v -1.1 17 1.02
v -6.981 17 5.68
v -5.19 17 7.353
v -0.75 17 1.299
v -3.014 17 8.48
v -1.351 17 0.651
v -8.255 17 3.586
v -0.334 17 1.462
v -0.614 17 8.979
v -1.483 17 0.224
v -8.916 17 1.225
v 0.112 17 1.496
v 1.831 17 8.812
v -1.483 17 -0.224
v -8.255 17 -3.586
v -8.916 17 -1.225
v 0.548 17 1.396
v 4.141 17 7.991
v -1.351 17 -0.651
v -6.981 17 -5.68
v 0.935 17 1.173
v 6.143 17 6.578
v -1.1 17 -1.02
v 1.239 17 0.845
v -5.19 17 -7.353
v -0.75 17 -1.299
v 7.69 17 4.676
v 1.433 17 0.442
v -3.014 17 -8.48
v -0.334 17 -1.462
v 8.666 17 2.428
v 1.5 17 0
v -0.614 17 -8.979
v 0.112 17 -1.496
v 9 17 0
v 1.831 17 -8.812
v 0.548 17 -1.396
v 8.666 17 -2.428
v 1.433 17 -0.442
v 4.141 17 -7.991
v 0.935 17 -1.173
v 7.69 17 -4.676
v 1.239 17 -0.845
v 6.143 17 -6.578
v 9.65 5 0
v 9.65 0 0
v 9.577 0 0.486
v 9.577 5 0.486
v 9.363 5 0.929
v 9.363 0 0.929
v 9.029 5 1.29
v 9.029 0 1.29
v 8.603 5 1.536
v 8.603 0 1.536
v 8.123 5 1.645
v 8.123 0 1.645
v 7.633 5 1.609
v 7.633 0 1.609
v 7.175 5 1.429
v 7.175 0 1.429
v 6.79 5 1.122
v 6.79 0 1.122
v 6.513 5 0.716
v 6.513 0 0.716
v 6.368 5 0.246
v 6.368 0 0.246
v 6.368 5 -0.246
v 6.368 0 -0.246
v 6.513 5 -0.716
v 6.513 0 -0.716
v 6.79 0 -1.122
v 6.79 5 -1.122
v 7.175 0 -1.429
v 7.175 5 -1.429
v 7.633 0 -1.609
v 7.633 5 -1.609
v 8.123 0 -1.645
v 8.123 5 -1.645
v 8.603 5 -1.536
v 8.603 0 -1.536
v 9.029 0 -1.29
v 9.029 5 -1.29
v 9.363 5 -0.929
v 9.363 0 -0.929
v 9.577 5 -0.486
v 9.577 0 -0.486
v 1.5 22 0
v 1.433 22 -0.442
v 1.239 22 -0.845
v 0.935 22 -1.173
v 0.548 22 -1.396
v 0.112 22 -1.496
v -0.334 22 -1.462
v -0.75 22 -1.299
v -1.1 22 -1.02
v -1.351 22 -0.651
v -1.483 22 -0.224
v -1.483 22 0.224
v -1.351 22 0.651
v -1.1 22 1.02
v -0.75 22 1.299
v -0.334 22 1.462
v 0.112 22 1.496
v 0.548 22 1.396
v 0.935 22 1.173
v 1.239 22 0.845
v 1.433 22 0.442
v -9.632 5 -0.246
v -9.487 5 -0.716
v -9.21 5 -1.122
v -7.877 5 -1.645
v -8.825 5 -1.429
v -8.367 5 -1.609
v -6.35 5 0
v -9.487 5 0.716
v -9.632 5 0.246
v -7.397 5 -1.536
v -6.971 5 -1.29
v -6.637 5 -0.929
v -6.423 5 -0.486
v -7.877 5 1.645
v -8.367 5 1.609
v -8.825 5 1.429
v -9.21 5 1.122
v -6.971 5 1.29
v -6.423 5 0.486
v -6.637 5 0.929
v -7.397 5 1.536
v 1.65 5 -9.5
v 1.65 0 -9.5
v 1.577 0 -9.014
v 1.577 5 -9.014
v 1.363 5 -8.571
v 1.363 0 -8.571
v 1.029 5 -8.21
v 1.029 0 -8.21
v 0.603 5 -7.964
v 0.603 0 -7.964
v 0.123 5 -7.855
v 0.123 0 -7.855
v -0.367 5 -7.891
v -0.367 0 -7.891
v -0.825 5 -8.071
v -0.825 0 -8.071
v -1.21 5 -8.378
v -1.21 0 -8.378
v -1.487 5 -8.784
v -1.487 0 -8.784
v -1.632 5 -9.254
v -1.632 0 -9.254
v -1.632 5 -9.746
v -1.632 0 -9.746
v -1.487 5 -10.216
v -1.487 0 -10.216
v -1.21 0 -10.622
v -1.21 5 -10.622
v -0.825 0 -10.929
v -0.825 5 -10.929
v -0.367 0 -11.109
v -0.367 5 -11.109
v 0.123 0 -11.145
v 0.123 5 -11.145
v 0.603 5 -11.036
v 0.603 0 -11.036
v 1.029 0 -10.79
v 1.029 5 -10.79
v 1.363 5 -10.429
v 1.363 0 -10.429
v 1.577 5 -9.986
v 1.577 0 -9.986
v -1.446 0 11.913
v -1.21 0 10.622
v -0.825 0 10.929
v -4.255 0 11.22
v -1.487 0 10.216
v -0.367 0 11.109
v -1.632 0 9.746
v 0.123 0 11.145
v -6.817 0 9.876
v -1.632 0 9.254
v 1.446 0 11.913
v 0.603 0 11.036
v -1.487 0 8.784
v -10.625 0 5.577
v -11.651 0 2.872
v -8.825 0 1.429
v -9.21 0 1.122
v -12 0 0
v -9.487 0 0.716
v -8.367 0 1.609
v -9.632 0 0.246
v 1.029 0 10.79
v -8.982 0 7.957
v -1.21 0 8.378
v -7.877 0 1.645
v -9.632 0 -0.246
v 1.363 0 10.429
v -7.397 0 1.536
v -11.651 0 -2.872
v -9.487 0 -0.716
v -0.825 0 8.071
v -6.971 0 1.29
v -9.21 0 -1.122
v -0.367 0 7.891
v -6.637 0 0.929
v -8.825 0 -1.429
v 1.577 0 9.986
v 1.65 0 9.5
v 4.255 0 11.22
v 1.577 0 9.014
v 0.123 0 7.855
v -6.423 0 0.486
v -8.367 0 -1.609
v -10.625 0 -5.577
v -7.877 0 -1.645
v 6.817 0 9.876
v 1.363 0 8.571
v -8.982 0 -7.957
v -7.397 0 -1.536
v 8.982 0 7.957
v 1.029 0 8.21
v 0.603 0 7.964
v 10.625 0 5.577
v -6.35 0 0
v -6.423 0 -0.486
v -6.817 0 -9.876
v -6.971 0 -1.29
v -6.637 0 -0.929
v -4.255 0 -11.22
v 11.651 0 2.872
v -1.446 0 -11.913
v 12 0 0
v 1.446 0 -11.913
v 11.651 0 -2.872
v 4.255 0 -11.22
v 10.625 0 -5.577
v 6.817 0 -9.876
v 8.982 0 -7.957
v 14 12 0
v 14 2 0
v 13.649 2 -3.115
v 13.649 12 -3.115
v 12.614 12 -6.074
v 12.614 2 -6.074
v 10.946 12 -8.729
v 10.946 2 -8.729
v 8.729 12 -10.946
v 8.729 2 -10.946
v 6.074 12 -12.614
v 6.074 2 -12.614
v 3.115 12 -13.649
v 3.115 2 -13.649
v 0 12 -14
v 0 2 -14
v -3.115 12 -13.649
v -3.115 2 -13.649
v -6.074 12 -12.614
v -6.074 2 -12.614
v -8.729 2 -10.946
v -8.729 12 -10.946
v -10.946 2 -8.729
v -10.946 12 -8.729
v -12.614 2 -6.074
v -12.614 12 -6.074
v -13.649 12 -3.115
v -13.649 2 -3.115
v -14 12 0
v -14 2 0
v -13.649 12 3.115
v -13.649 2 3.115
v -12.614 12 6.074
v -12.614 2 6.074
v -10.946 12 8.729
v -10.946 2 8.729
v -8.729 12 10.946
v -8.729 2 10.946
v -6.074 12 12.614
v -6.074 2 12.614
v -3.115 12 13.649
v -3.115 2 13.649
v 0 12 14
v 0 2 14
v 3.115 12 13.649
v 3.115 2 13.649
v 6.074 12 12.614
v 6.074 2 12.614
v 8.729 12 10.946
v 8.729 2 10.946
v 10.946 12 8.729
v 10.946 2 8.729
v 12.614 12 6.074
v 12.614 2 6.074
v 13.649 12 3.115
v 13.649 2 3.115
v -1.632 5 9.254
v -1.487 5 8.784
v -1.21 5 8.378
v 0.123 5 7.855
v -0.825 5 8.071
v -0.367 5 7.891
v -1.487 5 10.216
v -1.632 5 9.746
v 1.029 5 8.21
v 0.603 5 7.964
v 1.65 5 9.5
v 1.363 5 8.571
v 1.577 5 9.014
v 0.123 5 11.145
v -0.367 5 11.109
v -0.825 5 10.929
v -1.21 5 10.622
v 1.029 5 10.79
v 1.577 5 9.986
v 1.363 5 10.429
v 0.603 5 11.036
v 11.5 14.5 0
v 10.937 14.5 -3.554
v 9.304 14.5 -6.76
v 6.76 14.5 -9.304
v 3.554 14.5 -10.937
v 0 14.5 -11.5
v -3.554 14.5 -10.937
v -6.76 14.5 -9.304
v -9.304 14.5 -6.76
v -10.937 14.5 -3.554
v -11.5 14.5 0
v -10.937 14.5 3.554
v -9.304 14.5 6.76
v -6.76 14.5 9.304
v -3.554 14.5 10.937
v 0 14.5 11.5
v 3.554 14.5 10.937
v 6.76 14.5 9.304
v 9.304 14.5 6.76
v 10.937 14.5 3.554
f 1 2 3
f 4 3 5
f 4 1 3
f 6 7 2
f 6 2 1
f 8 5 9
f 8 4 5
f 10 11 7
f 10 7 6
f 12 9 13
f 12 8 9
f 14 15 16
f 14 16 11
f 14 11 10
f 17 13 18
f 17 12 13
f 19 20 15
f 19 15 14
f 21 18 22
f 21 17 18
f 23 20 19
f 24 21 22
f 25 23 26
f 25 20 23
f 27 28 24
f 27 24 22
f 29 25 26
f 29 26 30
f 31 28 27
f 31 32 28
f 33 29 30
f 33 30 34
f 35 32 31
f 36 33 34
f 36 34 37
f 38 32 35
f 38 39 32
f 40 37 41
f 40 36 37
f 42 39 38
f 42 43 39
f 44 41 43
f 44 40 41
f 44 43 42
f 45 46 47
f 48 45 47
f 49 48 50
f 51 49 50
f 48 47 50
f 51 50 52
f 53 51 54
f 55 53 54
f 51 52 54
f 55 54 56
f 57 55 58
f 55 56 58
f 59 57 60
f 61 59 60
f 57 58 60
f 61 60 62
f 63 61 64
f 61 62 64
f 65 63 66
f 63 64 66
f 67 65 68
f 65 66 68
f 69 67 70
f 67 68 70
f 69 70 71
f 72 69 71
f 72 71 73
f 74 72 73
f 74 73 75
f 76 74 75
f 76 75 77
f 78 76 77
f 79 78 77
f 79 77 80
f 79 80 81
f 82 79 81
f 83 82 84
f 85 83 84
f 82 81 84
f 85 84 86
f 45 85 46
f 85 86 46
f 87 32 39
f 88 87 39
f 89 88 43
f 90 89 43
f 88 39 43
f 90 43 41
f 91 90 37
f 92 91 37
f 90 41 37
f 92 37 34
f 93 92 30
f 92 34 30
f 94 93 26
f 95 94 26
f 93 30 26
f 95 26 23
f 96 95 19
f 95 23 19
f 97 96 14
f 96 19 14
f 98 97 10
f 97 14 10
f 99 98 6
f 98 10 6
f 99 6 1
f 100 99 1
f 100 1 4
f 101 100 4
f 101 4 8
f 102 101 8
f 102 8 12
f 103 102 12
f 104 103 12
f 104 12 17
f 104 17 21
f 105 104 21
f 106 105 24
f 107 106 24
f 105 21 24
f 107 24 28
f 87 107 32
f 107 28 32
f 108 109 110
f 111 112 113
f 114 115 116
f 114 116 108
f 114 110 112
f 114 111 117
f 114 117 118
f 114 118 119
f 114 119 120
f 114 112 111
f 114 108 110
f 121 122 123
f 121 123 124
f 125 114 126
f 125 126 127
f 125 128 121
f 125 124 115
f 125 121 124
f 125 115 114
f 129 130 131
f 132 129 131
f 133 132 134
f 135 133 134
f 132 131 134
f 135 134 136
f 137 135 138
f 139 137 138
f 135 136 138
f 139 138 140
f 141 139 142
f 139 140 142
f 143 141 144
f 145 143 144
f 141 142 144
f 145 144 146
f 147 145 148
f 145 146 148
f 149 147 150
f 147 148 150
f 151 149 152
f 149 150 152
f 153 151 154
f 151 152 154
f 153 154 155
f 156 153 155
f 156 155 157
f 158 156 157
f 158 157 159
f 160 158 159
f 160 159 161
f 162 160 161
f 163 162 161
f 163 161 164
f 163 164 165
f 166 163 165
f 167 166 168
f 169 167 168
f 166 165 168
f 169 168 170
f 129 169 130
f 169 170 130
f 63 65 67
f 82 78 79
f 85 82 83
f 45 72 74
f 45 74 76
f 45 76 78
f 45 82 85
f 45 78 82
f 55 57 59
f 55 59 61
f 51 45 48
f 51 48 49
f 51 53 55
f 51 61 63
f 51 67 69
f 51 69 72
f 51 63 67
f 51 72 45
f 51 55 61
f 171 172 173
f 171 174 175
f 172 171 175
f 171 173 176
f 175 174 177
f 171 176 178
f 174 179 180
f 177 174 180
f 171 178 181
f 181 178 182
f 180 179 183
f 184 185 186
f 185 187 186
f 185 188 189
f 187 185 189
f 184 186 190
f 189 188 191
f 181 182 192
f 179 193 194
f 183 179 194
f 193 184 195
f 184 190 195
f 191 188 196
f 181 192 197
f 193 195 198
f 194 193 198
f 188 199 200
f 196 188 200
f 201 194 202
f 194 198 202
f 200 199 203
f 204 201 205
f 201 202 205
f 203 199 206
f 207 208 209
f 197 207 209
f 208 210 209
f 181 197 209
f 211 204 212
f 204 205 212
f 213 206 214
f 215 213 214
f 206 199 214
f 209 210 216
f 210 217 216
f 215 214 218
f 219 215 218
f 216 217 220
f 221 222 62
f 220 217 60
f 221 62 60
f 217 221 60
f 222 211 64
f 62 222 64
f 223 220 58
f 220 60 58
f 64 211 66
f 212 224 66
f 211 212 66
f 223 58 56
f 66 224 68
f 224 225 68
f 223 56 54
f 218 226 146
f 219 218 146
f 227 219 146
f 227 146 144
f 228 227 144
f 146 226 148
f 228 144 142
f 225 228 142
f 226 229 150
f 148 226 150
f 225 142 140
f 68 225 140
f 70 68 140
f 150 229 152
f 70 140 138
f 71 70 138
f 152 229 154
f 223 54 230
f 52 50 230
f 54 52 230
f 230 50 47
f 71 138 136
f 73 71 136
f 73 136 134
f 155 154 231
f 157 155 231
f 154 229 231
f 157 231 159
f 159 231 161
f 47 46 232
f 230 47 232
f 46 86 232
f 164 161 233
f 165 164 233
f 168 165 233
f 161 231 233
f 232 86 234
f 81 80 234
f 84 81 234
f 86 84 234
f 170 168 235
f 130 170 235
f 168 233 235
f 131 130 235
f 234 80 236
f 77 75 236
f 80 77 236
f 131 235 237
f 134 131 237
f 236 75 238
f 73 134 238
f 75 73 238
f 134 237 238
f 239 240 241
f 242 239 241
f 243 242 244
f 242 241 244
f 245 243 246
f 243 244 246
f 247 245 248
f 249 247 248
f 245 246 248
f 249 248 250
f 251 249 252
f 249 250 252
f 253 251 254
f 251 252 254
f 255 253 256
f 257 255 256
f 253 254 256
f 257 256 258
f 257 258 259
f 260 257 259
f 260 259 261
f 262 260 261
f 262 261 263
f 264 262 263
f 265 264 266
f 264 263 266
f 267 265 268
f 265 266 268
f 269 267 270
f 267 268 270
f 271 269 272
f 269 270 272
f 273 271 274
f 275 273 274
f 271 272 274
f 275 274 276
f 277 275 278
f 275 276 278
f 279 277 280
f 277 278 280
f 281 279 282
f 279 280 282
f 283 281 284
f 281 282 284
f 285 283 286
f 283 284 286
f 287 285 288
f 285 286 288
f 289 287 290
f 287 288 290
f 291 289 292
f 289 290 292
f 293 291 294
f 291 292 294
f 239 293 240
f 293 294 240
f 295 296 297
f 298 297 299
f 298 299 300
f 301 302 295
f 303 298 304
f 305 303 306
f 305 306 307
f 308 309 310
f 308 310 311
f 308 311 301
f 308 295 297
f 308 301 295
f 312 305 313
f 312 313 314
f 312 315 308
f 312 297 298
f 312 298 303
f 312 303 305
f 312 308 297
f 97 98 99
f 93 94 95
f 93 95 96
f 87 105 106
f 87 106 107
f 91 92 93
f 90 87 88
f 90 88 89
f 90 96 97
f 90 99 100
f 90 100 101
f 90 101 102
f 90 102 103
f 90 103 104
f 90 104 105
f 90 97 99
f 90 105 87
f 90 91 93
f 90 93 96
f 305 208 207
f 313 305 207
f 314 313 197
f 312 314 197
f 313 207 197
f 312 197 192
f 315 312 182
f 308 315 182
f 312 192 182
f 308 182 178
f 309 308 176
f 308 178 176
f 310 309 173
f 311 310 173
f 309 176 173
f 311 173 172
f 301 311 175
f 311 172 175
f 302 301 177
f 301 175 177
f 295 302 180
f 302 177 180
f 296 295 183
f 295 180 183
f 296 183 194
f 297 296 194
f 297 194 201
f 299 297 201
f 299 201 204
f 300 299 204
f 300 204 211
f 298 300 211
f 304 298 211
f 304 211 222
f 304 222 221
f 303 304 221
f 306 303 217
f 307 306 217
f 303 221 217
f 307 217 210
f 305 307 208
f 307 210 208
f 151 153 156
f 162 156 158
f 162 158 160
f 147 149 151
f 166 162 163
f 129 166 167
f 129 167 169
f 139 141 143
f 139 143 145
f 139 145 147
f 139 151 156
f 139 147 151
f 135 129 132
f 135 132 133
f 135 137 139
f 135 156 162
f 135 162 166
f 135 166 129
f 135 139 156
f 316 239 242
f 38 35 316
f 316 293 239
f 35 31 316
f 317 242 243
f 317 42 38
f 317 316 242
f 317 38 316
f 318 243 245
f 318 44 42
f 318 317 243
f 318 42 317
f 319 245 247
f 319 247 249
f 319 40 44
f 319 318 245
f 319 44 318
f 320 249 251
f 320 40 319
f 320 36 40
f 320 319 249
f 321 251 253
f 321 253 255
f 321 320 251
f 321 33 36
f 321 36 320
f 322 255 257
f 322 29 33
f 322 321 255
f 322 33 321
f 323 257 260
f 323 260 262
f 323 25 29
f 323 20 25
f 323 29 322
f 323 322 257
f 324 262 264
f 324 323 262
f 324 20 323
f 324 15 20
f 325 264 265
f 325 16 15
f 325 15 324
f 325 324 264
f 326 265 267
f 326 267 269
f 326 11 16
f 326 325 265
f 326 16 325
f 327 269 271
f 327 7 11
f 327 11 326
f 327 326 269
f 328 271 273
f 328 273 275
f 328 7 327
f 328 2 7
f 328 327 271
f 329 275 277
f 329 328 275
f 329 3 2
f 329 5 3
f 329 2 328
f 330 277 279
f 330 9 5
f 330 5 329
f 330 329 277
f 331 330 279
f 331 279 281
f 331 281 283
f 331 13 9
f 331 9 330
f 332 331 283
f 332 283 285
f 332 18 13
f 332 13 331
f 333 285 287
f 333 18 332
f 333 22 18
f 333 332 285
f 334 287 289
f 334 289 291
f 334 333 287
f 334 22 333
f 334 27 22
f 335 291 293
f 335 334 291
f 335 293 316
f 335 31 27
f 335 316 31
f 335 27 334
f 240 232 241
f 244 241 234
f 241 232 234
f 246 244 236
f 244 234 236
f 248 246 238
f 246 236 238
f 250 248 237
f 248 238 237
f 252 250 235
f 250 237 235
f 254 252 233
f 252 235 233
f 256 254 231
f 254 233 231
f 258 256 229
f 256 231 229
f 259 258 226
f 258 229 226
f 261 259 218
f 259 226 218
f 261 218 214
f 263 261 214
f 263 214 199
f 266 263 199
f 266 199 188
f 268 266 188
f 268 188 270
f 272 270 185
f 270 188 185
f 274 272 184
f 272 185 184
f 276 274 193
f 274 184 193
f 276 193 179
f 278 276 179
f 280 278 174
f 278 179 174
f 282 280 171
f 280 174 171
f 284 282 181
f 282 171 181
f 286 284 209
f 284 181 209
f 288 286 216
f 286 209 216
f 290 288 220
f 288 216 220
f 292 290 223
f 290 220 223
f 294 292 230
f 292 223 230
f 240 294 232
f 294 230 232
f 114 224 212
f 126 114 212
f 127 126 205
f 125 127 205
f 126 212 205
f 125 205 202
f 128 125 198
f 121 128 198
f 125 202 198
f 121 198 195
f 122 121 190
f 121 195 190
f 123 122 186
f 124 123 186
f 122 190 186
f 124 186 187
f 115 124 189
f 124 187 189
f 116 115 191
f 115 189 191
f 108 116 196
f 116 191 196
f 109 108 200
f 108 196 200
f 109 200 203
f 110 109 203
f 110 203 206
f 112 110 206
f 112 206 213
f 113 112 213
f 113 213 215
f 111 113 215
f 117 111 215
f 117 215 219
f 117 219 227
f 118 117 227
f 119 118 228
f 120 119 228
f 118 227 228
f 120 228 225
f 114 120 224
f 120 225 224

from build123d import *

# Parameters (mm, degrees)
SKETCH1_R           = 14
BOSS_EXTRUDE1_DEPTH = 17
CHAMFER1_SIZE       = 5
CHAMFER3_SIZE       = 2
SKETCH3_R           = 1.65
CUT_EXTRUDE1_DEPTH  = 5
SKETCH4_R           = 1.5
BOSS_EXTRUDE2_DEPTH = 5


with BuildPart() as part:
    # Sketch1 → Boss-Extrude1 (new body)
    with BuildSketch(Plane(origin=(0, 0, 0), x_dir=(1, 0, 0), z_dir=(0, 1, 0))):
        Circle(SKETCH1_R)
    extrude(amount=BOSS_EXTRUDE1_DEPTH)

    # Chamfer1
    chamfer1_edges = [part.edges().sort_by_distance(p)[0] for p in [
        (-14, 17, 0),
    ]]
    chamfer(chamfer1_edges, length=CHAMFER1_SIZE)

    # Chamfer3
    chamfer3_edges = [part.edges().sort_by_distance(p)[0] for p in [
        (-14, 0, 0),
    ]]
    chamfer(chamfer3_edges, length=CHAMFER3_SIZE)

    # Sketch3 → Cut-Extrude1 (cut)
    with BuildSketch(Plane.XZ):
        with Locations((0, 9.5)):
            Circle(SKETCH3_R)
        with Locations((0, -9.5)):
            Circle(SKETCH3_R)
        with Locations((-8, 0)):
            Circle(SKETCH3_R)
        with Locations((8, 0)):
            Circle(SKETCH3_R)
    extrude(amount=-CUT_EXTRUDE1_DEPTH, mode=Mode.SUBTRACT)

    # Sketch4 → Boss-Extrude2 (add)
    with BuildSketch(Plane(origin=(0, 17, 0), x_dir=(1, 0, 0), z_dir=(0, 1, 0))):
        Circle(SKETCH4_R)
    extrude(amount=BOSS_EXTRUDE2_DEPTH)


solid = part.part
